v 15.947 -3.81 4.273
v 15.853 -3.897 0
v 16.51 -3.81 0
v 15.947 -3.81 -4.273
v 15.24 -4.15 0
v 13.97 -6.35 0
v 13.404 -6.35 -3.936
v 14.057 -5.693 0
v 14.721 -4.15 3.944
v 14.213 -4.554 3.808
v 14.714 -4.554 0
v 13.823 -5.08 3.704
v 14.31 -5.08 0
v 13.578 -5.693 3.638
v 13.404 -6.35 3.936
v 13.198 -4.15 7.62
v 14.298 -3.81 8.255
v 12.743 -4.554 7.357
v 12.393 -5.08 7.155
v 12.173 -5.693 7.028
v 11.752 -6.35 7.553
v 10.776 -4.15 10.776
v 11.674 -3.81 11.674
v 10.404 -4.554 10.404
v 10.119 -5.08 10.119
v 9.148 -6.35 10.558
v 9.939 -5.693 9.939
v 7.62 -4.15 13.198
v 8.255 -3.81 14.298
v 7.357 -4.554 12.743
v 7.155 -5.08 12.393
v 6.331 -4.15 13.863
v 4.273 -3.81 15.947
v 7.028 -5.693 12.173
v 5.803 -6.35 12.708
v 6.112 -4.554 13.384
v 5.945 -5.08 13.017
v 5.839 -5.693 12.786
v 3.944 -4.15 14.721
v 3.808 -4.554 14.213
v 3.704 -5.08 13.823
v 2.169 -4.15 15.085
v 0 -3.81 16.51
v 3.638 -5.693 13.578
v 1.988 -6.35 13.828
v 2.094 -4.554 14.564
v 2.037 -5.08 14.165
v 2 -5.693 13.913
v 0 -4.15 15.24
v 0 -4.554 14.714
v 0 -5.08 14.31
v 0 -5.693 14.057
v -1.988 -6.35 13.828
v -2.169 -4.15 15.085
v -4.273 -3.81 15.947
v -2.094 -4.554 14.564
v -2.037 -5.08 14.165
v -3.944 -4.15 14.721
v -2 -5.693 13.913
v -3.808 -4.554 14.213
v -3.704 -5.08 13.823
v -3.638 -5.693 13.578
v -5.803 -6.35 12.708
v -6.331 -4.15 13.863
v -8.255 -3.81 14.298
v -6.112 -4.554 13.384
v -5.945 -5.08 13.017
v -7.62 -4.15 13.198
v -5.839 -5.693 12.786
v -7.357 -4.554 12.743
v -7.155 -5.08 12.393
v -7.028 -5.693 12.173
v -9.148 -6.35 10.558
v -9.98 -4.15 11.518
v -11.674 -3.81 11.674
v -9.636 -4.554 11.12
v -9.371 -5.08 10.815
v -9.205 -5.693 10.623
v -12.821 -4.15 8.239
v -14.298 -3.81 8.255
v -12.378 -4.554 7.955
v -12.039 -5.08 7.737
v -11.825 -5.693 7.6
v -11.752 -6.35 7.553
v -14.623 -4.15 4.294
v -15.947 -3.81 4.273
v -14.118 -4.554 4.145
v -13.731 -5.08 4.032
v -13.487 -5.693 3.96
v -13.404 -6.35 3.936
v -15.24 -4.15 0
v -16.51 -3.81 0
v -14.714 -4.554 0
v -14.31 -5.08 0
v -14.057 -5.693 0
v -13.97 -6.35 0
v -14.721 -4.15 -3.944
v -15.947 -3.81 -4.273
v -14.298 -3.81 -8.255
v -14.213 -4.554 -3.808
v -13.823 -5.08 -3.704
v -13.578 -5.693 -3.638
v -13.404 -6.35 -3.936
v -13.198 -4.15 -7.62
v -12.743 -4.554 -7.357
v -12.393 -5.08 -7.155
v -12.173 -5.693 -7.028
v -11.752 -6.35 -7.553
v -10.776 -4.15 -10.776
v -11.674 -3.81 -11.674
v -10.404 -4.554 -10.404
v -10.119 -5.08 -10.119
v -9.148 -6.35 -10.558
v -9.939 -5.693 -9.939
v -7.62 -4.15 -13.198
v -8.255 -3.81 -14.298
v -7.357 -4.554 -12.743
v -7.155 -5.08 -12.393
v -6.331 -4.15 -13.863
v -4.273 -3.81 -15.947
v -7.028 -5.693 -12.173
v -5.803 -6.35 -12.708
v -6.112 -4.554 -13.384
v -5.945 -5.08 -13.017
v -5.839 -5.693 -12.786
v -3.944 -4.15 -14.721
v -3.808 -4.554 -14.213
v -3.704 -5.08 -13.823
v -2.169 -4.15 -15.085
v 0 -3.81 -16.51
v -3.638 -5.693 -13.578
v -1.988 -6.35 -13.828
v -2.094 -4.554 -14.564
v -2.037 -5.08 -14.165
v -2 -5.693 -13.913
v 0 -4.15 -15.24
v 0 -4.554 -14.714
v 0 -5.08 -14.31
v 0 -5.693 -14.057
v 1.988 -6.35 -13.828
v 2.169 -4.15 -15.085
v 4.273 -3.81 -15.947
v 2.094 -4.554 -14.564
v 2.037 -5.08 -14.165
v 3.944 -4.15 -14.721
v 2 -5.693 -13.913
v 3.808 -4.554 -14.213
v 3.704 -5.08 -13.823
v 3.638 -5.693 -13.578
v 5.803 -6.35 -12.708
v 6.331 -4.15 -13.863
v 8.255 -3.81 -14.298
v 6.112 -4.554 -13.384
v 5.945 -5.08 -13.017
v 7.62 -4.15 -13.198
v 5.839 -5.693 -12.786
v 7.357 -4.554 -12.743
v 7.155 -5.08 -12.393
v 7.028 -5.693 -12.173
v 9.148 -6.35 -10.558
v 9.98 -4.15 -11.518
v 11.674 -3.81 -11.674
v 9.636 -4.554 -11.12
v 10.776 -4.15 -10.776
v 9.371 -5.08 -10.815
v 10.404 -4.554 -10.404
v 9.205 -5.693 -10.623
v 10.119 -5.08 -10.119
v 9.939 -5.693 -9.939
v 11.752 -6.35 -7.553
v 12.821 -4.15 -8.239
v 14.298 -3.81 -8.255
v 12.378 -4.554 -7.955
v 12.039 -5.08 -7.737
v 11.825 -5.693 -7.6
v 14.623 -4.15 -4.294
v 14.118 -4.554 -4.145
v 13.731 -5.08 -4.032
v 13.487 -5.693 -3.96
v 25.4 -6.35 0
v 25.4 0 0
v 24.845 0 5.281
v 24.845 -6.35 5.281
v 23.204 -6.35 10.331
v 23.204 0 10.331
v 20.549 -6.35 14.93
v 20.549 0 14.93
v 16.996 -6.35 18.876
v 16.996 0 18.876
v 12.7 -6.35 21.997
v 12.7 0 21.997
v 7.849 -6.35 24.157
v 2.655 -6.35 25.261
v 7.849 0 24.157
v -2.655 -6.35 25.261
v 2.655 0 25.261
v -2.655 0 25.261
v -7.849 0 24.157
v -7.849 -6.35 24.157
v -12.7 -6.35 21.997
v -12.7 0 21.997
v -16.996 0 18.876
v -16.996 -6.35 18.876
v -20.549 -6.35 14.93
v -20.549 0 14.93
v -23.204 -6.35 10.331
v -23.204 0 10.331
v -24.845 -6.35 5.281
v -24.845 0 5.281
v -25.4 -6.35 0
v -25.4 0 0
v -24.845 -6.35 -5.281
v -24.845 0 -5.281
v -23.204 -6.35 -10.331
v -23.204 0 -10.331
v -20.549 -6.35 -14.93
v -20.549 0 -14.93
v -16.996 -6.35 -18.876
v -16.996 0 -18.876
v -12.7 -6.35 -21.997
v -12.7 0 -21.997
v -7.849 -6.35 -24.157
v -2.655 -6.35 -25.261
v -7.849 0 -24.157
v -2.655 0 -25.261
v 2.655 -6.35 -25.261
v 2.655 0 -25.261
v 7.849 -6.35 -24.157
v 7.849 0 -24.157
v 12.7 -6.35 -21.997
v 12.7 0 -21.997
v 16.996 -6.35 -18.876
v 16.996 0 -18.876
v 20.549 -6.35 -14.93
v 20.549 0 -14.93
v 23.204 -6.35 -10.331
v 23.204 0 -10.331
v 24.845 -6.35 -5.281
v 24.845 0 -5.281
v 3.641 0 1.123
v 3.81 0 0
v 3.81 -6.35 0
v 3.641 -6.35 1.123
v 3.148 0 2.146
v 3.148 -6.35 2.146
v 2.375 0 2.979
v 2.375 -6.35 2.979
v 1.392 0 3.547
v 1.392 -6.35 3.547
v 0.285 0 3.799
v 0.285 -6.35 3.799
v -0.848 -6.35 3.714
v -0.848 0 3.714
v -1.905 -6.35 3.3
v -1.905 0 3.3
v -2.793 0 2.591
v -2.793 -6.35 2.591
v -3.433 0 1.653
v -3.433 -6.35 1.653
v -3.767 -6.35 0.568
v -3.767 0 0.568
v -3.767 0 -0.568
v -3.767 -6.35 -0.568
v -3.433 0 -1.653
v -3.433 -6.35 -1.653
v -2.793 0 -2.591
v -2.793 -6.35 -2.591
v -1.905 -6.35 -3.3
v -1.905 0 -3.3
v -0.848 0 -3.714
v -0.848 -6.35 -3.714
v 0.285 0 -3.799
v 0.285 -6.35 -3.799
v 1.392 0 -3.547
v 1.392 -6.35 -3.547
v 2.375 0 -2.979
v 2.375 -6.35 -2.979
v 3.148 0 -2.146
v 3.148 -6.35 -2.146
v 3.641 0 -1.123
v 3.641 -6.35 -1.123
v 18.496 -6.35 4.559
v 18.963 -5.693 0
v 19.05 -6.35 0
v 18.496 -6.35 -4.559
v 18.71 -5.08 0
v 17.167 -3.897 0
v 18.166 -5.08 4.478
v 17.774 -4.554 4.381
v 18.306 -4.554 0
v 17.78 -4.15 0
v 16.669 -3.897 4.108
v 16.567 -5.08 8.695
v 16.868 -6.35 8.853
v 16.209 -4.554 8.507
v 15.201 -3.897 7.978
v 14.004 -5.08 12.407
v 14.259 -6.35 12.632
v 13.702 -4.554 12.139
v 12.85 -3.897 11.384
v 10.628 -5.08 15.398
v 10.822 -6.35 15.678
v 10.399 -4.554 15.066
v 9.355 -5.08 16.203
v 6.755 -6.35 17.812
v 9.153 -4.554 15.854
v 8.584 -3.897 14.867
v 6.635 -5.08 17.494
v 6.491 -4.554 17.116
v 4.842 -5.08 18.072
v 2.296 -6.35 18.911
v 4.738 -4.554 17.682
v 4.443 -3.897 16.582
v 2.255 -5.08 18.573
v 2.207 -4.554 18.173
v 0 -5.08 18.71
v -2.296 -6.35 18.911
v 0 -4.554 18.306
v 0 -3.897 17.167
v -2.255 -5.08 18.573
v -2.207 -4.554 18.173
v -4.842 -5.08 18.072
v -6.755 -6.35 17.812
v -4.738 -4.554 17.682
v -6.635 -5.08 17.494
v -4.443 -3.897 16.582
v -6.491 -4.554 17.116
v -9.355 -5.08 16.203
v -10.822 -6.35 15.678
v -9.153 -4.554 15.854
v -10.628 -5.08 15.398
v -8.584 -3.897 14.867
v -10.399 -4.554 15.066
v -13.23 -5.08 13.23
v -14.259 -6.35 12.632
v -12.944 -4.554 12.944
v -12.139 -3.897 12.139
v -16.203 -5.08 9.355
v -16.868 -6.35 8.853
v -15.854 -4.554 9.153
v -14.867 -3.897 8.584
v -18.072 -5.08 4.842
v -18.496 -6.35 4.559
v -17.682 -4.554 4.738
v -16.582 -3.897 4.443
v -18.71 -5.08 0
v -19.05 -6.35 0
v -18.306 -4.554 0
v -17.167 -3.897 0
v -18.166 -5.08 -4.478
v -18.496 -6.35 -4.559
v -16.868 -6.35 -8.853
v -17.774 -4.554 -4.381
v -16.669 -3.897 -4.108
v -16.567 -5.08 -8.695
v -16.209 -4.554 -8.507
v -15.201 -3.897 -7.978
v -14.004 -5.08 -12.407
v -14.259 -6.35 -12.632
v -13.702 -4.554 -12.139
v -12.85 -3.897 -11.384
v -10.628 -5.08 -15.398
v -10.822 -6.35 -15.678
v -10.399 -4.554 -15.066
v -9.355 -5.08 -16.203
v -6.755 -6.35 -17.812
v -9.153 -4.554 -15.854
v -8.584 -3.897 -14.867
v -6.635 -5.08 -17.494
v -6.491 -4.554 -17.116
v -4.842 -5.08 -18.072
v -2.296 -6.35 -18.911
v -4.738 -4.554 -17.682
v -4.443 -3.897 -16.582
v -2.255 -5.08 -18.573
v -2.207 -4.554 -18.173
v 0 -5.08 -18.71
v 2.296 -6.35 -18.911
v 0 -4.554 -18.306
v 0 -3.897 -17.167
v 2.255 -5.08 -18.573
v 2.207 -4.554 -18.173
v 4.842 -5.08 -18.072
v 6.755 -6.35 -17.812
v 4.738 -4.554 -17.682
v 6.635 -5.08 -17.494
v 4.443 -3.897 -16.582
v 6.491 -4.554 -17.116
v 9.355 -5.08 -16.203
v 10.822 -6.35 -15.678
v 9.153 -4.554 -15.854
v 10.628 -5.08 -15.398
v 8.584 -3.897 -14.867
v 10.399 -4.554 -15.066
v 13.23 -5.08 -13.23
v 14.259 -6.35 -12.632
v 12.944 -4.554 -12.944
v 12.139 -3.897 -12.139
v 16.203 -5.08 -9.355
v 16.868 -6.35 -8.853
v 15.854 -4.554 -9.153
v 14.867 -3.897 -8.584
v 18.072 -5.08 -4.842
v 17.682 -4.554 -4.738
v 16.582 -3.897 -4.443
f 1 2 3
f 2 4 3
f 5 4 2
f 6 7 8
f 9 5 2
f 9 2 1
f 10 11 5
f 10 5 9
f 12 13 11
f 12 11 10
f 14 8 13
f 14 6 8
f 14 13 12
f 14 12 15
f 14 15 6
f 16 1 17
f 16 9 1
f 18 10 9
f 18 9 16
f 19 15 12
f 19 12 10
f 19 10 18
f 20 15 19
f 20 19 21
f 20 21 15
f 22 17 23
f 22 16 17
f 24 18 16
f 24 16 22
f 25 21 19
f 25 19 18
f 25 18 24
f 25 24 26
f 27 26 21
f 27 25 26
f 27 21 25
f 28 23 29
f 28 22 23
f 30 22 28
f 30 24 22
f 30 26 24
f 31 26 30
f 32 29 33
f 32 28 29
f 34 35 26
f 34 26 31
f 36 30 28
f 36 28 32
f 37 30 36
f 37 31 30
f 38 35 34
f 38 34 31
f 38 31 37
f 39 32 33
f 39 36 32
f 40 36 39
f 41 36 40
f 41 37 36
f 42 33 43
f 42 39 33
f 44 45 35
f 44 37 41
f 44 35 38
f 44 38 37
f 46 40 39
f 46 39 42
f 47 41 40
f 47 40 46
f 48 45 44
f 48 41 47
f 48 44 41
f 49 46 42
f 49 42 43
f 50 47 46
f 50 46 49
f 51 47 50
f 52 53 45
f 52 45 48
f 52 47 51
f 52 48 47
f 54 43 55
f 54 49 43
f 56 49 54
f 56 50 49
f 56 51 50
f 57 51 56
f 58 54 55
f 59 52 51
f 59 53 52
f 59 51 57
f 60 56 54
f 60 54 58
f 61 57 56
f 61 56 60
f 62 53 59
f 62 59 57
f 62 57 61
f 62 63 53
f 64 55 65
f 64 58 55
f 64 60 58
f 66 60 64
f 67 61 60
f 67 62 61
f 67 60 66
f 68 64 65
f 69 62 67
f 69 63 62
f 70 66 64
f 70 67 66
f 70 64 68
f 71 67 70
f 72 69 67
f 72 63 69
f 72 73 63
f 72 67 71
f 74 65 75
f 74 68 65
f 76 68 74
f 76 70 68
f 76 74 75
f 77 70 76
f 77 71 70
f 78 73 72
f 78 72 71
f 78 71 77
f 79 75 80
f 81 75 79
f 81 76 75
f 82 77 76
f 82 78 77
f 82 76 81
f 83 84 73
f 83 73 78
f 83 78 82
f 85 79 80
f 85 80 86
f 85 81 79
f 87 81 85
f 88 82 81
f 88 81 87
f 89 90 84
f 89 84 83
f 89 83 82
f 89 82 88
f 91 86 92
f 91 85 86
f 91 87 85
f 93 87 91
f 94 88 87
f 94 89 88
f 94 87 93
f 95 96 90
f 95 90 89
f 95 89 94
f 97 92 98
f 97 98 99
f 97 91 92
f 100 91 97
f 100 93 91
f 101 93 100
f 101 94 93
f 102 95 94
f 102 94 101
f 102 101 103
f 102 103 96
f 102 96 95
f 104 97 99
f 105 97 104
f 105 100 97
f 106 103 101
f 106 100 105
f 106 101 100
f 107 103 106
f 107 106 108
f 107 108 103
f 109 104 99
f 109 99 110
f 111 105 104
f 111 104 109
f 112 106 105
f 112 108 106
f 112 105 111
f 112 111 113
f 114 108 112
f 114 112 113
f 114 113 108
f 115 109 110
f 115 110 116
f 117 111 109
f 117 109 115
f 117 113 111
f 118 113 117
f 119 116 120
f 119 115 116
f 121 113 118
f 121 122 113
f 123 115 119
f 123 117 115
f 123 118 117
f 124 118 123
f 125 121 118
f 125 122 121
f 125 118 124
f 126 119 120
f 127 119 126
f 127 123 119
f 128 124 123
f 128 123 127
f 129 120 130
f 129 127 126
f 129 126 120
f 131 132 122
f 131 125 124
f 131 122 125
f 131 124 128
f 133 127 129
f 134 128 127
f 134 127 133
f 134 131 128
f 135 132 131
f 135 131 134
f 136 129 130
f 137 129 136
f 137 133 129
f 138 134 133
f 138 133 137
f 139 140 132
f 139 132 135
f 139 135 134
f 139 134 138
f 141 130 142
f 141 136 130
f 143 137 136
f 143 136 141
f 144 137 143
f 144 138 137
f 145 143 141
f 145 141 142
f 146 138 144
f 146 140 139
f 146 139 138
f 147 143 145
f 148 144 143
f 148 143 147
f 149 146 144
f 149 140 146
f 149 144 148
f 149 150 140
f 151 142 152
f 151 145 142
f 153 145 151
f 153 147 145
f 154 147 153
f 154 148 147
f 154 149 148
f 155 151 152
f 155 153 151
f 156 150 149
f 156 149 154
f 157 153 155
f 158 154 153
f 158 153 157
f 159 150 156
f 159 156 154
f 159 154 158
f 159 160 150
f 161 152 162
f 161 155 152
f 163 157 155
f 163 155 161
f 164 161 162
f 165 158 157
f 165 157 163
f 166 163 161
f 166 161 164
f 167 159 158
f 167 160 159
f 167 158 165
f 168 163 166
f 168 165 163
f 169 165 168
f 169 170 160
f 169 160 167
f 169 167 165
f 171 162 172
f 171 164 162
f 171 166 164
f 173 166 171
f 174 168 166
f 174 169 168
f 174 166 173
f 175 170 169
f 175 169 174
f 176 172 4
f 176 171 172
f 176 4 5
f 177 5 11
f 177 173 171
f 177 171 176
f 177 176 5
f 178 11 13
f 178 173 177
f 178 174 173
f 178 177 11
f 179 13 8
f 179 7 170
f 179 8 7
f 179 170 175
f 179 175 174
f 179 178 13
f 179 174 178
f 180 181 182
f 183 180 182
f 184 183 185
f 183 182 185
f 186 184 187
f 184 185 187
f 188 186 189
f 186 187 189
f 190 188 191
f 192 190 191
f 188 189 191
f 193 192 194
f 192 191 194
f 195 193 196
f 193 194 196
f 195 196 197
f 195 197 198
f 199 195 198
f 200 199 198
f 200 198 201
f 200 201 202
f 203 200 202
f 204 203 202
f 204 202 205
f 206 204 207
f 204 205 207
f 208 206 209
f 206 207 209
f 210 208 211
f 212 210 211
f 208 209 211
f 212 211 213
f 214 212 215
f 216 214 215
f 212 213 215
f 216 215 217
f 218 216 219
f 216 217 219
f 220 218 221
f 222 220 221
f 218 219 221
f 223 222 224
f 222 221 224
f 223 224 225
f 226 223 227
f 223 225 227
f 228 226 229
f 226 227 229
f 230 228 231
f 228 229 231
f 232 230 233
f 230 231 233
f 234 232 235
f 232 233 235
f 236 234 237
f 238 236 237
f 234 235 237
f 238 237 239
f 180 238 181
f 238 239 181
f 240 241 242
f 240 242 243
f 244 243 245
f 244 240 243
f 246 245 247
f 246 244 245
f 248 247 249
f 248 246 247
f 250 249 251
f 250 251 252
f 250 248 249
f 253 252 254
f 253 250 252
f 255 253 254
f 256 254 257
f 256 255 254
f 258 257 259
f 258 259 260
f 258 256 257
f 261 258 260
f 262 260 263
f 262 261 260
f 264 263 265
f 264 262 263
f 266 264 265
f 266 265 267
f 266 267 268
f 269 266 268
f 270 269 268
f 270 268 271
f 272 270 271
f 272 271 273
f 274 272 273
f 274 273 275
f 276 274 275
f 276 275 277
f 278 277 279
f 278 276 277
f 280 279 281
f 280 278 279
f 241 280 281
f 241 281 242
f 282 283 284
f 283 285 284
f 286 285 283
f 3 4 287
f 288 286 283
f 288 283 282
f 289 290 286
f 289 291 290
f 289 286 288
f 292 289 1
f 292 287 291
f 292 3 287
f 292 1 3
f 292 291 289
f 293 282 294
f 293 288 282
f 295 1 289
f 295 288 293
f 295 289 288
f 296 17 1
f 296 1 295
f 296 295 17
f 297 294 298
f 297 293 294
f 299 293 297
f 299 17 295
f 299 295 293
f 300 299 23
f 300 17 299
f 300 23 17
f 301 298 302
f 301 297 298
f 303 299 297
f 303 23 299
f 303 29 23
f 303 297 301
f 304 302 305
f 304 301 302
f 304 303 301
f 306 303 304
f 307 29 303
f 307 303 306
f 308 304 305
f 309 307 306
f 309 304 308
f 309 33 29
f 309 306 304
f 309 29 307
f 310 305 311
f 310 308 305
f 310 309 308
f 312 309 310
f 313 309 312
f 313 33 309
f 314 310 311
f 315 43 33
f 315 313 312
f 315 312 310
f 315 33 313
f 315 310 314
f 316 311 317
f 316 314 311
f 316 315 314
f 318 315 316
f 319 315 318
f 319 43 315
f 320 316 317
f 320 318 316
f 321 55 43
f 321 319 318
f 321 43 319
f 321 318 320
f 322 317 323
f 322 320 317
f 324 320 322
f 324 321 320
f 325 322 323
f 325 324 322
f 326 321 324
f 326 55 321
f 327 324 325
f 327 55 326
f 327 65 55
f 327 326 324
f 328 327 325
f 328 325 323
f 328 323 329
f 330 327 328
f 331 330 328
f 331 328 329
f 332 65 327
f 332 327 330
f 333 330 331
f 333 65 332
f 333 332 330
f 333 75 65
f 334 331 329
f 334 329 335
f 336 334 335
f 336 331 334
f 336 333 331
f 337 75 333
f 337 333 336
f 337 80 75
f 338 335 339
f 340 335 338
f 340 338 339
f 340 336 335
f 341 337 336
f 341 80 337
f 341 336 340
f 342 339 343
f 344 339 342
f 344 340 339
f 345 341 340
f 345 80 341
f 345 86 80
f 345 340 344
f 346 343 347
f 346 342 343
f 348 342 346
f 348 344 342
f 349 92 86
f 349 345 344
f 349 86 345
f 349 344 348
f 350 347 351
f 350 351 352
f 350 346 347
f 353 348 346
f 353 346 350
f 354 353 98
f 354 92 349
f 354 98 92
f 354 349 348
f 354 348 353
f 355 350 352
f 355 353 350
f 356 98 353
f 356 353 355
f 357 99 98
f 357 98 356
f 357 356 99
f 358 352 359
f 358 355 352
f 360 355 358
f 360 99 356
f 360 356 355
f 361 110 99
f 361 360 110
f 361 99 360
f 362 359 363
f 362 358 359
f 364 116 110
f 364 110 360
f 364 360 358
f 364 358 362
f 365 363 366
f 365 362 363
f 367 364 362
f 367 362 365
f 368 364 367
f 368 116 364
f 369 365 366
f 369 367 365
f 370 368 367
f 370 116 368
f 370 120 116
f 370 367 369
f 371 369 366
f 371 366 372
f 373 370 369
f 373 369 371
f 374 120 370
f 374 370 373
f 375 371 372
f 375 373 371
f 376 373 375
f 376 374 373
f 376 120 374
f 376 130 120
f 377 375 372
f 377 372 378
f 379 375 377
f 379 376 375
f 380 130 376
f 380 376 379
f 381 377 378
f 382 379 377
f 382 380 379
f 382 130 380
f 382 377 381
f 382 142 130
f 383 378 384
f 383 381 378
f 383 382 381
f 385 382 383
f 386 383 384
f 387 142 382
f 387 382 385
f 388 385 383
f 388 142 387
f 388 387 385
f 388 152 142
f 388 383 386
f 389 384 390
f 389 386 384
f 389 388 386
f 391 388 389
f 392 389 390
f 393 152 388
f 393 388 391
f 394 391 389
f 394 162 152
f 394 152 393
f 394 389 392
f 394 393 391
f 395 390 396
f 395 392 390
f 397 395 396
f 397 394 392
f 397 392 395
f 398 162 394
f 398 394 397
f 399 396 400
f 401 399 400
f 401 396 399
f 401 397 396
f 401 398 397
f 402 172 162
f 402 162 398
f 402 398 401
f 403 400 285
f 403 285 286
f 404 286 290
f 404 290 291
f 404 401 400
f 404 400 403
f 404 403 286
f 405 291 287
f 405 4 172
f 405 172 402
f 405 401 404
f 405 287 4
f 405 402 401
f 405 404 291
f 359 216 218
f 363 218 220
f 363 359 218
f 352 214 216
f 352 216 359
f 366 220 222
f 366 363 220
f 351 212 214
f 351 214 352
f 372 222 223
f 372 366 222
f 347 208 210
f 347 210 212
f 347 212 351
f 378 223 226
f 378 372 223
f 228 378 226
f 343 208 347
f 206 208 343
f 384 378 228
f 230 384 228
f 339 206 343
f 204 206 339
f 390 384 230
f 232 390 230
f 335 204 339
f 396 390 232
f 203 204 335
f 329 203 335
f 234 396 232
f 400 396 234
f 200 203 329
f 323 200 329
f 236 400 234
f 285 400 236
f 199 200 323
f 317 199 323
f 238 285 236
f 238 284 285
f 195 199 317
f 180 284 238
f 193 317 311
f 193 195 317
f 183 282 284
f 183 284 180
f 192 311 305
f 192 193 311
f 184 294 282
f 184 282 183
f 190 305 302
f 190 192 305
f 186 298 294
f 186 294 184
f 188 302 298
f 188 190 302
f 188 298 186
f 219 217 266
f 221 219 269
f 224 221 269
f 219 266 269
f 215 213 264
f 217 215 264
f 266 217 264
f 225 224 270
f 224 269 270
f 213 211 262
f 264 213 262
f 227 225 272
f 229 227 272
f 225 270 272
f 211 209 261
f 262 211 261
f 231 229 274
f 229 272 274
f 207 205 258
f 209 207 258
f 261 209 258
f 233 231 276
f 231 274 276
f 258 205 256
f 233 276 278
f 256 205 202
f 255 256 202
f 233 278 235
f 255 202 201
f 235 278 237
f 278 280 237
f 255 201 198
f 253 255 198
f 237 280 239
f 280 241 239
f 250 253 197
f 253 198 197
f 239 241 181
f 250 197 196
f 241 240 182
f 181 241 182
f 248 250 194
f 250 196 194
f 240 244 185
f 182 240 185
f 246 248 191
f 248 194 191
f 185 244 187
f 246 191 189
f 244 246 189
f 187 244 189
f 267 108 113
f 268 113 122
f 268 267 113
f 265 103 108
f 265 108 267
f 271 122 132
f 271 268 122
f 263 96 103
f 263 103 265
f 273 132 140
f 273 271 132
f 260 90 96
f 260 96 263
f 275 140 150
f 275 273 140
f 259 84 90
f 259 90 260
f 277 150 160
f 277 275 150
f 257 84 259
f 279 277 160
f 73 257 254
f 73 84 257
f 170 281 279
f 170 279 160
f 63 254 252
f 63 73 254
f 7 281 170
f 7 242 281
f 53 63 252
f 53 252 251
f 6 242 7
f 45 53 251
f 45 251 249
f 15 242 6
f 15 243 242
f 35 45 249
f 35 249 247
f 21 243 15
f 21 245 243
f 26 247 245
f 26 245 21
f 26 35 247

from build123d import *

# Parameters (mm, degrees)
F0_R     = 25.4
F0_R_2   = 3.81
F1_DEPTH = 6.35
F2_R     = 19.05
F2_R_2   = 13.97
F3_DEPTH = 2.54
F4_R     = 2.53999


# Not quite as in the source:
# - a fillet or chamfer is up to 0.001 mm smaller than in the source, because OpenCascade refuses the exact size


with BuildPart() as f1:
    # F0 (on Front) → F1 (new body)
    with BuildSketch(Plane.XZ):
        Circle(F0_R)
        Circle(F0_R_2, mode=Mode.SUBTRACT)
    extrude(amount=F1_DEPTH)

    # F2 (on face) → F3 (cut)
    with BuildSketch(Plane.XZ.offset(6.35)):
        Circle(F2_R)
        Circle(F2_R_2, mode=Mode.SUBTRACT)
    extrude(amount=-F3_DEPTH, mode=Mode.SUBTRACT)

    # F4 (radius 2.54 in the source; OpenCascade refuses exactly that, so slightly less here)
    f4_edges = [f1.edges().sort_by_distance(p)[0] for p in [
        (-19.05, -3.81, 0),
        (-13.97, -3.81, 0),
    ]]
    fillet(f4_edges, radius=F4_R)


solid = f1.part
